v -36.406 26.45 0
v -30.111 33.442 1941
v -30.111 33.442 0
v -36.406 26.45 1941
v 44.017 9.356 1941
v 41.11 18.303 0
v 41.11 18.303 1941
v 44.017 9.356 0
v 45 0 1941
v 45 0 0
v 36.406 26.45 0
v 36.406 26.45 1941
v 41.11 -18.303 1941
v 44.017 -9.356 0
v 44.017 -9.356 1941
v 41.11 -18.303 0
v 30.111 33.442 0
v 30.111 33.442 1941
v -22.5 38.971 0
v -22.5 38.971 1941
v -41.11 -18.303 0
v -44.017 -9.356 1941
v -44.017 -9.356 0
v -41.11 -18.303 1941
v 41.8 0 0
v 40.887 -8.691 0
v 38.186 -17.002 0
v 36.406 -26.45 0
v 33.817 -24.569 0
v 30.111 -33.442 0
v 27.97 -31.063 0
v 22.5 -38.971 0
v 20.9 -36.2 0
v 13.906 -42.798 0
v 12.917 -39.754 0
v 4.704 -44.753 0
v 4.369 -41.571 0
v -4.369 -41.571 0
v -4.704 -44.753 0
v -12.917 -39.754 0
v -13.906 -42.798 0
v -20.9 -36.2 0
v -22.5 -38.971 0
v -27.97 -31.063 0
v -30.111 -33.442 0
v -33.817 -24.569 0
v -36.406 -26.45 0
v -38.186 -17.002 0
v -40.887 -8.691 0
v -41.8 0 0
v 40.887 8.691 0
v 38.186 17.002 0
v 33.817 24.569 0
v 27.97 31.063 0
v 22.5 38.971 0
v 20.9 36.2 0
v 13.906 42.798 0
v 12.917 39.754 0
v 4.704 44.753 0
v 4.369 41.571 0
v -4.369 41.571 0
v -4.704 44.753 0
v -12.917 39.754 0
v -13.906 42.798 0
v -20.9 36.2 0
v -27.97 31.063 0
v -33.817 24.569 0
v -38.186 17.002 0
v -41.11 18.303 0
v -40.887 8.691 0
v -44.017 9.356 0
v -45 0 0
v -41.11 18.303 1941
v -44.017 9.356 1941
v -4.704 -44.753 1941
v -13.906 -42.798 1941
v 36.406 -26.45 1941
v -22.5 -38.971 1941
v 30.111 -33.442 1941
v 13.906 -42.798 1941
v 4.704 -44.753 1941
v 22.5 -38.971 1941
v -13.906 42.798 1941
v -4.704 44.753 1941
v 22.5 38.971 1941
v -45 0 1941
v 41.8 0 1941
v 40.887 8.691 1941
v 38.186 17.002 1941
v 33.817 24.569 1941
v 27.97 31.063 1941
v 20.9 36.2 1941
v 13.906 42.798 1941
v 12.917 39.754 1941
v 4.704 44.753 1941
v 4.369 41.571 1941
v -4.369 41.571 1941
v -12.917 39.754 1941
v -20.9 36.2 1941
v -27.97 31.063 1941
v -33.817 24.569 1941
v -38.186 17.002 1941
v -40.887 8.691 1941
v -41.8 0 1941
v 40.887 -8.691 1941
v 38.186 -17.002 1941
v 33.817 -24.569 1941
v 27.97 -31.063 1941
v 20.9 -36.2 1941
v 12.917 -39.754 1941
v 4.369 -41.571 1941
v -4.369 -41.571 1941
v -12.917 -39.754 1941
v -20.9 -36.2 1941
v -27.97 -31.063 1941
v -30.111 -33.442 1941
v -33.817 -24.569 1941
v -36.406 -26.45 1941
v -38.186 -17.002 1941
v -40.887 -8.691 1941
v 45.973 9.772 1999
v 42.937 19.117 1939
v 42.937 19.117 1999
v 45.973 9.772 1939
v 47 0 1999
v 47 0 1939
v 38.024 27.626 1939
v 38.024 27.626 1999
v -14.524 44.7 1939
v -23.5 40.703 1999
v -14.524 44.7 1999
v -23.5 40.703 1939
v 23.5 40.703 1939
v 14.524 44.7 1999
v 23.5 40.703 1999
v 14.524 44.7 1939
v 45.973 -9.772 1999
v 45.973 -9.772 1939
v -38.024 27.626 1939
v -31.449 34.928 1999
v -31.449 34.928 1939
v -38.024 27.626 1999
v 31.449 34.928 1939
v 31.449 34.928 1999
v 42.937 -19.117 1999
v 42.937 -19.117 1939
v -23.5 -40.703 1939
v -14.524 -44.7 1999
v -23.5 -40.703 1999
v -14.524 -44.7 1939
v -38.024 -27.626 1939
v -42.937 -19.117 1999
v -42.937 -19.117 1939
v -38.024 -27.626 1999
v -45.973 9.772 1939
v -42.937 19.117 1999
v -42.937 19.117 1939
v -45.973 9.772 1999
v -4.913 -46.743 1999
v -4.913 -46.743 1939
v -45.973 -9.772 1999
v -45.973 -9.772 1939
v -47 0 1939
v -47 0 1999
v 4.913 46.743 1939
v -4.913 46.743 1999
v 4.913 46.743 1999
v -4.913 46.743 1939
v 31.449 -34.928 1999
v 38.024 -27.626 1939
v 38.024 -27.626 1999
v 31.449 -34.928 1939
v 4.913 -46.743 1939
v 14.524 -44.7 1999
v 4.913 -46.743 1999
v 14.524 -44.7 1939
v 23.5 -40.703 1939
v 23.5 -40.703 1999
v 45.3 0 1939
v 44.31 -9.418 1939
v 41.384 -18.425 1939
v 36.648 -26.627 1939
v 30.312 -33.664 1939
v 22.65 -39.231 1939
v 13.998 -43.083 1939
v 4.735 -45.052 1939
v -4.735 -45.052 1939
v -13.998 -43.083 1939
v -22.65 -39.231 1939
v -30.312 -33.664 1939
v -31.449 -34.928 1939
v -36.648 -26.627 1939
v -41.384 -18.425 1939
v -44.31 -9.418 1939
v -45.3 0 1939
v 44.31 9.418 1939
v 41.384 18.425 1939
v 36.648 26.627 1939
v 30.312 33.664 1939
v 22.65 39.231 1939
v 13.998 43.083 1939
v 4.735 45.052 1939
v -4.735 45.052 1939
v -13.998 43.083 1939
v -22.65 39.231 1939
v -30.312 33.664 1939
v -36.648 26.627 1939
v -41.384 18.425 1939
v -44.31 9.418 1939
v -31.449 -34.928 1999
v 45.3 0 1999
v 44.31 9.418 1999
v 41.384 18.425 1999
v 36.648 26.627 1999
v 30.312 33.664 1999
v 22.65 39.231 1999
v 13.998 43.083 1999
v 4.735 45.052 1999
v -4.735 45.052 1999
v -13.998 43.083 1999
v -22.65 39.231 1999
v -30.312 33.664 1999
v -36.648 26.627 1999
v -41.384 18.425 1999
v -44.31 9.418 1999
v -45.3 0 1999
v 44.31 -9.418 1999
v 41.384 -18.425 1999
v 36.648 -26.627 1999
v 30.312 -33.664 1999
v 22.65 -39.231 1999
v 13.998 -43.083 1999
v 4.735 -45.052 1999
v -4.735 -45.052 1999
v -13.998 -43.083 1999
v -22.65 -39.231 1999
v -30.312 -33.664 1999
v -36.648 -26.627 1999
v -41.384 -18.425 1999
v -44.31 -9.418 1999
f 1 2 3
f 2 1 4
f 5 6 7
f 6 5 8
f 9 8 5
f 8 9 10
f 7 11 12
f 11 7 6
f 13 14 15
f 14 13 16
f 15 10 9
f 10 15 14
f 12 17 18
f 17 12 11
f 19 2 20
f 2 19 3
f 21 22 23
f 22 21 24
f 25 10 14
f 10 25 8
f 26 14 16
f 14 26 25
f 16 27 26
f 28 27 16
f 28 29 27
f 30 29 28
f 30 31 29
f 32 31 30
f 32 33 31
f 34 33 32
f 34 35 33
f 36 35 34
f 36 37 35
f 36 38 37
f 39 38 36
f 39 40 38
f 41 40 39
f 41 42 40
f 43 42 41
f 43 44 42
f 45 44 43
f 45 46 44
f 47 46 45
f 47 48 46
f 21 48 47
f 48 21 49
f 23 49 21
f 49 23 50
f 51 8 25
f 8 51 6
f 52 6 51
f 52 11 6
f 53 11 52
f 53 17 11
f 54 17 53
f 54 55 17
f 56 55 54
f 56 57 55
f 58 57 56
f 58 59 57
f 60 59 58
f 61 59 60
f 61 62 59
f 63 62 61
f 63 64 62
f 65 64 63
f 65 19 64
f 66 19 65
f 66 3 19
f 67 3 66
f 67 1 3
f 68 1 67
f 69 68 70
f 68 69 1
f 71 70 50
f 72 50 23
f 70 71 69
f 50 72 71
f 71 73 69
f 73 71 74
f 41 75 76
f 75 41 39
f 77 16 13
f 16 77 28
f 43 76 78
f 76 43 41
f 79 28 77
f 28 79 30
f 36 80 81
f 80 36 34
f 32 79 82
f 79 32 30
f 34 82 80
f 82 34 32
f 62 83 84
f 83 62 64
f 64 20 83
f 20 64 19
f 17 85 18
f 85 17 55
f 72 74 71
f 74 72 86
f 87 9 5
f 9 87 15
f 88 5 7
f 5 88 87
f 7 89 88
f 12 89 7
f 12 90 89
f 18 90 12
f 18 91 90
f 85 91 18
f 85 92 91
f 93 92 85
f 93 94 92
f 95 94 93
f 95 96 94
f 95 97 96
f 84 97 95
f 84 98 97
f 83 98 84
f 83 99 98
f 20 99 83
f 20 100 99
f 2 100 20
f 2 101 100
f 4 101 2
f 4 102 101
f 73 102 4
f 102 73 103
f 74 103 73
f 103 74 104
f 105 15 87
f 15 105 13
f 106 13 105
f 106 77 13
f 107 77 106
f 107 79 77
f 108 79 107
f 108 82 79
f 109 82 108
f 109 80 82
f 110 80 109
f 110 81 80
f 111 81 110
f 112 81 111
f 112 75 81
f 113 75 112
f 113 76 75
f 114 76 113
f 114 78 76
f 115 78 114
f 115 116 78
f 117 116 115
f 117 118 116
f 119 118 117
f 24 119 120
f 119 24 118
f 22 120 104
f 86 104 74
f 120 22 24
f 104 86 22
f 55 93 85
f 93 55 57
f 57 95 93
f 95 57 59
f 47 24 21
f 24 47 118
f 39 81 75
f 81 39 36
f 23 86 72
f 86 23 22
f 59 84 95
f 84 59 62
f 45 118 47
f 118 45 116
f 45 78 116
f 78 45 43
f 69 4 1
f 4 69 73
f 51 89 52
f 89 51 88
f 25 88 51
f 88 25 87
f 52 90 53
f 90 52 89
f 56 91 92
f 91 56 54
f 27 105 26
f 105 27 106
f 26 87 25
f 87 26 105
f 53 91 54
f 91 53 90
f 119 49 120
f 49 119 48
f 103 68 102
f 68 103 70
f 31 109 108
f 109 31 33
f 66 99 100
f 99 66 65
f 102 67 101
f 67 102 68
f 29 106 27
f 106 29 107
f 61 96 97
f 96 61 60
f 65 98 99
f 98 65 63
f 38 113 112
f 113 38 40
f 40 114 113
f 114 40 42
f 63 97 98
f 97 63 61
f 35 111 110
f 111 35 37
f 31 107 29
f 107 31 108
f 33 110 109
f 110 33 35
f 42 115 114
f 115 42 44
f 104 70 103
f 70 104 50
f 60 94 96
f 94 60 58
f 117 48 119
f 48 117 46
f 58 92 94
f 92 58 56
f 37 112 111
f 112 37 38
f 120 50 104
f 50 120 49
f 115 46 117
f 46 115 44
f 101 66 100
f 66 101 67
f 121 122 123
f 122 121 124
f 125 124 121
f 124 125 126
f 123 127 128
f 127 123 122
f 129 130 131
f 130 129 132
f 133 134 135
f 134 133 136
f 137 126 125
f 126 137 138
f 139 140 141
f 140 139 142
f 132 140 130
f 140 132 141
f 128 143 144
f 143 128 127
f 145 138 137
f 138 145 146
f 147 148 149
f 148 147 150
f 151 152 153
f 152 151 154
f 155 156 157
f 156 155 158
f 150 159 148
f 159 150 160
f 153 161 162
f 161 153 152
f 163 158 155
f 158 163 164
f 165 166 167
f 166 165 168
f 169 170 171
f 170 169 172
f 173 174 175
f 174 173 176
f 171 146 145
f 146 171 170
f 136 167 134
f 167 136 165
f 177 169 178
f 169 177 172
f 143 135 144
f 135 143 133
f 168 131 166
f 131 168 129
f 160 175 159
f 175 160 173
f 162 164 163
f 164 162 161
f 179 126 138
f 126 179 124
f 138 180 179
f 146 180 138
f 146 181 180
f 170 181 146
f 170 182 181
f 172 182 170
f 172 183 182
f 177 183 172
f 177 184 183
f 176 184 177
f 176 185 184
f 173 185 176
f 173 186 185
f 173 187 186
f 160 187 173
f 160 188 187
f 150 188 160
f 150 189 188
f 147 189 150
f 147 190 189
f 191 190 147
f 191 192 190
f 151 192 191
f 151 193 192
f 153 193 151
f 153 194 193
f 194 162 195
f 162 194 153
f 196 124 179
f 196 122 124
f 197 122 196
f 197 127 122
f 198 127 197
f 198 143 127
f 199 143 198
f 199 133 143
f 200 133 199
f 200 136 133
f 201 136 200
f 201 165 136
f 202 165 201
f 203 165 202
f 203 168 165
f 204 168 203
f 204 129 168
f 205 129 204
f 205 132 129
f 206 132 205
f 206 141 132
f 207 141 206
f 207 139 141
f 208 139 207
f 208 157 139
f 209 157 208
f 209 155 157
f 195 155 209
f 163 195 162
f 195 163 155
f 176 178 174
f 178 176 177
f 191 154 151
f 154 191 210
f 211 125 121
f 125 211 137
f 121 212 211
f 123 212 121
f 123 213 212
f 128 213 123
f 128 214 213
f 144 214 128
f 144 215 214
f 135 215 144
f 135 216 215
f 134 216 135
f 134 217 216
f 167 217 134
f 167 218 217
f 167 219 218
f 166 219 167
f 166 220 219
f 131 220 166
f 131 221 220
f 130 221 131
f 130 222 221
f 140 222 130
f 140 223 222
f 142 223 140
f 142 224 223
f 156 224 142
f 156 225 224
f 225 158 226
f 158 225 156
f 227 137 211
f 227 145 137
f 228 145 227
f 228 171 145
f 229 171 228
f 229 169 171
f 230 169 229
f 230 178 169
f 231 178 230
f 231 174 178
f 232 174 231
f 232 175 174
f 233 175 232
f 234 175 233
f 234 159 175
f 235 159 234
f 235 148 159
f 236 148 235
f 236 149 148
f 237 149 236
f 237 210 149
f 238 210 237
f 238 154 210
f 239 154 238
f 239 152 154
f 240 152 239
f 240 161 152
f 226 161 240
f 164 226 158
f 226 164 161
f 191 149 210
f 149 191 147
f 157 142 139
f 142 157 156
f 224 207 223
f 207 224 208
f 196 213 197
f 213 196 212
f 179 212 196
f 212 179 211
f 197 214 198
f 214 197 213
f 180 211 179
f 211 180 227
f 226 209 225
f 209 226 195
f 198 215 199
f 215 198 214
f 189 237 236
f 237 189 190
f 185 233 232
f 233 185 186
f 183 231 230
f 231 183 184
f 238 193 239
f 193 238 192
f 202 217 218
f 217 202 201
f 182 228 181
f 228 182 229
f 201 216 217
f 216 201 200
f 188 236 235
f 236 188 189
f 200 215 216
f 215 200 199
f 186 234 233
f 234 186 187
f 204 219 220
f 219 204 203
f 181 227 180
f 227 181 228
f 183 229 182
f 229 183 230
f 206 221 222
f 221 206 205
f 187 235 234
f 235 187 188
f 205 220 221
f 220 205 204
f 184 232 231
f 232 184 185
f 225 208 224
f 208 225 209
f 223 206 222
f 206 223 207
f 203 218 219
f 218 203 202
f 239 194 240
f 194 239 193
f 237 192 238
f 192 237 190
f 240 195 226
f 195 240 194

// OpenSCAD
// Parameters
length_mm = 2000; //[1000:4000:10]
include_end_fitting = 1; //[0:1:1]
od_mm = 90; //[75:110:1]
wall_mm = 3.2; //[2:6:0.1]
socket_length_mm = 60; //[30:120:1]
socket_wall_extra_mm = 2.0; //[0.5:6:0.1]
socket_id_clearance_mm = 0.6; //[0.2:1.5:0.1]
stop_ring_thickness_mm = 3; //[1:8:0.5]
stop_ring_length_mm = 6; //[2:20:1]
overlap_mm = 1; //[0.5:2:0.1]

// HT Pipe - complete geometry
module ht_pipe() {
  color([0.85, 0.85, 0.8]) { // PVC color
    union() {
      // Pipe body
      difference() {
        cylinder(h=length_mm - include_end_fitting * socket_length_mm + overlap_mm, r=od_mm/2, center=false);
        translate([0, 0, -overlap_mm])
          cylinder(h=length_mm - include_end_fitting * socket_length_mm + overlap_mm + 2 * overlap_mm, r=od_mm/2 - wall_mm, center=false);
      }
      
      // End fitting geometry
      if (include_end_fitting) {
        difference() {
          union() {
            // Socket outer
            translate([0, 0, length_mm - include_end_fitting * socket_length_mm - overlap_mm])
              cylinder(h=include_end_fitting * socket_length_mm, r=od_mm/2 + socket_wall_extra_mm, center=false);
            
            // Socket stop ring
            difference() {
              translate([0, 0, length_mm - include_end_fitting * socket_length_mm + include_end_fitting * (socket_length_mm * 0.6) - overlap_mm])
                cylinder(h=include_end_fitting * stop_ring_length_mm, r=od_mm/2 + socket_id_clearance_mm/2, center=false);
              translate([0, 0, length_mm - include_end_fitting * socket_length_mm + include_end_fitting * (socket_length_mm * 0.6) - overlap_mm - overlap_mm])
                cylinder(h=include_end_fitting * stop_ring_length_mm + 2 * overlap_mm, r=od_mm/2 + socket_id_clearance_mm/2 - stop_ring_thickness_mm, center=false);
            }
          }
          
          // Socket inner void
          translate([0, 0, length_mm - include_end_fitting * socket_length_mm - overlap_mm - overlap_mm])
            cylinder(h=include_end_fitting * socket_length_mm + 2 * overlap_mm, r=od_mm/2 + socket_id_clearance_mm/2, center=false);
        }
      }
    }
  }
}

// Assembly
module assembly() {
  ht_pipe();
}

assembly();
